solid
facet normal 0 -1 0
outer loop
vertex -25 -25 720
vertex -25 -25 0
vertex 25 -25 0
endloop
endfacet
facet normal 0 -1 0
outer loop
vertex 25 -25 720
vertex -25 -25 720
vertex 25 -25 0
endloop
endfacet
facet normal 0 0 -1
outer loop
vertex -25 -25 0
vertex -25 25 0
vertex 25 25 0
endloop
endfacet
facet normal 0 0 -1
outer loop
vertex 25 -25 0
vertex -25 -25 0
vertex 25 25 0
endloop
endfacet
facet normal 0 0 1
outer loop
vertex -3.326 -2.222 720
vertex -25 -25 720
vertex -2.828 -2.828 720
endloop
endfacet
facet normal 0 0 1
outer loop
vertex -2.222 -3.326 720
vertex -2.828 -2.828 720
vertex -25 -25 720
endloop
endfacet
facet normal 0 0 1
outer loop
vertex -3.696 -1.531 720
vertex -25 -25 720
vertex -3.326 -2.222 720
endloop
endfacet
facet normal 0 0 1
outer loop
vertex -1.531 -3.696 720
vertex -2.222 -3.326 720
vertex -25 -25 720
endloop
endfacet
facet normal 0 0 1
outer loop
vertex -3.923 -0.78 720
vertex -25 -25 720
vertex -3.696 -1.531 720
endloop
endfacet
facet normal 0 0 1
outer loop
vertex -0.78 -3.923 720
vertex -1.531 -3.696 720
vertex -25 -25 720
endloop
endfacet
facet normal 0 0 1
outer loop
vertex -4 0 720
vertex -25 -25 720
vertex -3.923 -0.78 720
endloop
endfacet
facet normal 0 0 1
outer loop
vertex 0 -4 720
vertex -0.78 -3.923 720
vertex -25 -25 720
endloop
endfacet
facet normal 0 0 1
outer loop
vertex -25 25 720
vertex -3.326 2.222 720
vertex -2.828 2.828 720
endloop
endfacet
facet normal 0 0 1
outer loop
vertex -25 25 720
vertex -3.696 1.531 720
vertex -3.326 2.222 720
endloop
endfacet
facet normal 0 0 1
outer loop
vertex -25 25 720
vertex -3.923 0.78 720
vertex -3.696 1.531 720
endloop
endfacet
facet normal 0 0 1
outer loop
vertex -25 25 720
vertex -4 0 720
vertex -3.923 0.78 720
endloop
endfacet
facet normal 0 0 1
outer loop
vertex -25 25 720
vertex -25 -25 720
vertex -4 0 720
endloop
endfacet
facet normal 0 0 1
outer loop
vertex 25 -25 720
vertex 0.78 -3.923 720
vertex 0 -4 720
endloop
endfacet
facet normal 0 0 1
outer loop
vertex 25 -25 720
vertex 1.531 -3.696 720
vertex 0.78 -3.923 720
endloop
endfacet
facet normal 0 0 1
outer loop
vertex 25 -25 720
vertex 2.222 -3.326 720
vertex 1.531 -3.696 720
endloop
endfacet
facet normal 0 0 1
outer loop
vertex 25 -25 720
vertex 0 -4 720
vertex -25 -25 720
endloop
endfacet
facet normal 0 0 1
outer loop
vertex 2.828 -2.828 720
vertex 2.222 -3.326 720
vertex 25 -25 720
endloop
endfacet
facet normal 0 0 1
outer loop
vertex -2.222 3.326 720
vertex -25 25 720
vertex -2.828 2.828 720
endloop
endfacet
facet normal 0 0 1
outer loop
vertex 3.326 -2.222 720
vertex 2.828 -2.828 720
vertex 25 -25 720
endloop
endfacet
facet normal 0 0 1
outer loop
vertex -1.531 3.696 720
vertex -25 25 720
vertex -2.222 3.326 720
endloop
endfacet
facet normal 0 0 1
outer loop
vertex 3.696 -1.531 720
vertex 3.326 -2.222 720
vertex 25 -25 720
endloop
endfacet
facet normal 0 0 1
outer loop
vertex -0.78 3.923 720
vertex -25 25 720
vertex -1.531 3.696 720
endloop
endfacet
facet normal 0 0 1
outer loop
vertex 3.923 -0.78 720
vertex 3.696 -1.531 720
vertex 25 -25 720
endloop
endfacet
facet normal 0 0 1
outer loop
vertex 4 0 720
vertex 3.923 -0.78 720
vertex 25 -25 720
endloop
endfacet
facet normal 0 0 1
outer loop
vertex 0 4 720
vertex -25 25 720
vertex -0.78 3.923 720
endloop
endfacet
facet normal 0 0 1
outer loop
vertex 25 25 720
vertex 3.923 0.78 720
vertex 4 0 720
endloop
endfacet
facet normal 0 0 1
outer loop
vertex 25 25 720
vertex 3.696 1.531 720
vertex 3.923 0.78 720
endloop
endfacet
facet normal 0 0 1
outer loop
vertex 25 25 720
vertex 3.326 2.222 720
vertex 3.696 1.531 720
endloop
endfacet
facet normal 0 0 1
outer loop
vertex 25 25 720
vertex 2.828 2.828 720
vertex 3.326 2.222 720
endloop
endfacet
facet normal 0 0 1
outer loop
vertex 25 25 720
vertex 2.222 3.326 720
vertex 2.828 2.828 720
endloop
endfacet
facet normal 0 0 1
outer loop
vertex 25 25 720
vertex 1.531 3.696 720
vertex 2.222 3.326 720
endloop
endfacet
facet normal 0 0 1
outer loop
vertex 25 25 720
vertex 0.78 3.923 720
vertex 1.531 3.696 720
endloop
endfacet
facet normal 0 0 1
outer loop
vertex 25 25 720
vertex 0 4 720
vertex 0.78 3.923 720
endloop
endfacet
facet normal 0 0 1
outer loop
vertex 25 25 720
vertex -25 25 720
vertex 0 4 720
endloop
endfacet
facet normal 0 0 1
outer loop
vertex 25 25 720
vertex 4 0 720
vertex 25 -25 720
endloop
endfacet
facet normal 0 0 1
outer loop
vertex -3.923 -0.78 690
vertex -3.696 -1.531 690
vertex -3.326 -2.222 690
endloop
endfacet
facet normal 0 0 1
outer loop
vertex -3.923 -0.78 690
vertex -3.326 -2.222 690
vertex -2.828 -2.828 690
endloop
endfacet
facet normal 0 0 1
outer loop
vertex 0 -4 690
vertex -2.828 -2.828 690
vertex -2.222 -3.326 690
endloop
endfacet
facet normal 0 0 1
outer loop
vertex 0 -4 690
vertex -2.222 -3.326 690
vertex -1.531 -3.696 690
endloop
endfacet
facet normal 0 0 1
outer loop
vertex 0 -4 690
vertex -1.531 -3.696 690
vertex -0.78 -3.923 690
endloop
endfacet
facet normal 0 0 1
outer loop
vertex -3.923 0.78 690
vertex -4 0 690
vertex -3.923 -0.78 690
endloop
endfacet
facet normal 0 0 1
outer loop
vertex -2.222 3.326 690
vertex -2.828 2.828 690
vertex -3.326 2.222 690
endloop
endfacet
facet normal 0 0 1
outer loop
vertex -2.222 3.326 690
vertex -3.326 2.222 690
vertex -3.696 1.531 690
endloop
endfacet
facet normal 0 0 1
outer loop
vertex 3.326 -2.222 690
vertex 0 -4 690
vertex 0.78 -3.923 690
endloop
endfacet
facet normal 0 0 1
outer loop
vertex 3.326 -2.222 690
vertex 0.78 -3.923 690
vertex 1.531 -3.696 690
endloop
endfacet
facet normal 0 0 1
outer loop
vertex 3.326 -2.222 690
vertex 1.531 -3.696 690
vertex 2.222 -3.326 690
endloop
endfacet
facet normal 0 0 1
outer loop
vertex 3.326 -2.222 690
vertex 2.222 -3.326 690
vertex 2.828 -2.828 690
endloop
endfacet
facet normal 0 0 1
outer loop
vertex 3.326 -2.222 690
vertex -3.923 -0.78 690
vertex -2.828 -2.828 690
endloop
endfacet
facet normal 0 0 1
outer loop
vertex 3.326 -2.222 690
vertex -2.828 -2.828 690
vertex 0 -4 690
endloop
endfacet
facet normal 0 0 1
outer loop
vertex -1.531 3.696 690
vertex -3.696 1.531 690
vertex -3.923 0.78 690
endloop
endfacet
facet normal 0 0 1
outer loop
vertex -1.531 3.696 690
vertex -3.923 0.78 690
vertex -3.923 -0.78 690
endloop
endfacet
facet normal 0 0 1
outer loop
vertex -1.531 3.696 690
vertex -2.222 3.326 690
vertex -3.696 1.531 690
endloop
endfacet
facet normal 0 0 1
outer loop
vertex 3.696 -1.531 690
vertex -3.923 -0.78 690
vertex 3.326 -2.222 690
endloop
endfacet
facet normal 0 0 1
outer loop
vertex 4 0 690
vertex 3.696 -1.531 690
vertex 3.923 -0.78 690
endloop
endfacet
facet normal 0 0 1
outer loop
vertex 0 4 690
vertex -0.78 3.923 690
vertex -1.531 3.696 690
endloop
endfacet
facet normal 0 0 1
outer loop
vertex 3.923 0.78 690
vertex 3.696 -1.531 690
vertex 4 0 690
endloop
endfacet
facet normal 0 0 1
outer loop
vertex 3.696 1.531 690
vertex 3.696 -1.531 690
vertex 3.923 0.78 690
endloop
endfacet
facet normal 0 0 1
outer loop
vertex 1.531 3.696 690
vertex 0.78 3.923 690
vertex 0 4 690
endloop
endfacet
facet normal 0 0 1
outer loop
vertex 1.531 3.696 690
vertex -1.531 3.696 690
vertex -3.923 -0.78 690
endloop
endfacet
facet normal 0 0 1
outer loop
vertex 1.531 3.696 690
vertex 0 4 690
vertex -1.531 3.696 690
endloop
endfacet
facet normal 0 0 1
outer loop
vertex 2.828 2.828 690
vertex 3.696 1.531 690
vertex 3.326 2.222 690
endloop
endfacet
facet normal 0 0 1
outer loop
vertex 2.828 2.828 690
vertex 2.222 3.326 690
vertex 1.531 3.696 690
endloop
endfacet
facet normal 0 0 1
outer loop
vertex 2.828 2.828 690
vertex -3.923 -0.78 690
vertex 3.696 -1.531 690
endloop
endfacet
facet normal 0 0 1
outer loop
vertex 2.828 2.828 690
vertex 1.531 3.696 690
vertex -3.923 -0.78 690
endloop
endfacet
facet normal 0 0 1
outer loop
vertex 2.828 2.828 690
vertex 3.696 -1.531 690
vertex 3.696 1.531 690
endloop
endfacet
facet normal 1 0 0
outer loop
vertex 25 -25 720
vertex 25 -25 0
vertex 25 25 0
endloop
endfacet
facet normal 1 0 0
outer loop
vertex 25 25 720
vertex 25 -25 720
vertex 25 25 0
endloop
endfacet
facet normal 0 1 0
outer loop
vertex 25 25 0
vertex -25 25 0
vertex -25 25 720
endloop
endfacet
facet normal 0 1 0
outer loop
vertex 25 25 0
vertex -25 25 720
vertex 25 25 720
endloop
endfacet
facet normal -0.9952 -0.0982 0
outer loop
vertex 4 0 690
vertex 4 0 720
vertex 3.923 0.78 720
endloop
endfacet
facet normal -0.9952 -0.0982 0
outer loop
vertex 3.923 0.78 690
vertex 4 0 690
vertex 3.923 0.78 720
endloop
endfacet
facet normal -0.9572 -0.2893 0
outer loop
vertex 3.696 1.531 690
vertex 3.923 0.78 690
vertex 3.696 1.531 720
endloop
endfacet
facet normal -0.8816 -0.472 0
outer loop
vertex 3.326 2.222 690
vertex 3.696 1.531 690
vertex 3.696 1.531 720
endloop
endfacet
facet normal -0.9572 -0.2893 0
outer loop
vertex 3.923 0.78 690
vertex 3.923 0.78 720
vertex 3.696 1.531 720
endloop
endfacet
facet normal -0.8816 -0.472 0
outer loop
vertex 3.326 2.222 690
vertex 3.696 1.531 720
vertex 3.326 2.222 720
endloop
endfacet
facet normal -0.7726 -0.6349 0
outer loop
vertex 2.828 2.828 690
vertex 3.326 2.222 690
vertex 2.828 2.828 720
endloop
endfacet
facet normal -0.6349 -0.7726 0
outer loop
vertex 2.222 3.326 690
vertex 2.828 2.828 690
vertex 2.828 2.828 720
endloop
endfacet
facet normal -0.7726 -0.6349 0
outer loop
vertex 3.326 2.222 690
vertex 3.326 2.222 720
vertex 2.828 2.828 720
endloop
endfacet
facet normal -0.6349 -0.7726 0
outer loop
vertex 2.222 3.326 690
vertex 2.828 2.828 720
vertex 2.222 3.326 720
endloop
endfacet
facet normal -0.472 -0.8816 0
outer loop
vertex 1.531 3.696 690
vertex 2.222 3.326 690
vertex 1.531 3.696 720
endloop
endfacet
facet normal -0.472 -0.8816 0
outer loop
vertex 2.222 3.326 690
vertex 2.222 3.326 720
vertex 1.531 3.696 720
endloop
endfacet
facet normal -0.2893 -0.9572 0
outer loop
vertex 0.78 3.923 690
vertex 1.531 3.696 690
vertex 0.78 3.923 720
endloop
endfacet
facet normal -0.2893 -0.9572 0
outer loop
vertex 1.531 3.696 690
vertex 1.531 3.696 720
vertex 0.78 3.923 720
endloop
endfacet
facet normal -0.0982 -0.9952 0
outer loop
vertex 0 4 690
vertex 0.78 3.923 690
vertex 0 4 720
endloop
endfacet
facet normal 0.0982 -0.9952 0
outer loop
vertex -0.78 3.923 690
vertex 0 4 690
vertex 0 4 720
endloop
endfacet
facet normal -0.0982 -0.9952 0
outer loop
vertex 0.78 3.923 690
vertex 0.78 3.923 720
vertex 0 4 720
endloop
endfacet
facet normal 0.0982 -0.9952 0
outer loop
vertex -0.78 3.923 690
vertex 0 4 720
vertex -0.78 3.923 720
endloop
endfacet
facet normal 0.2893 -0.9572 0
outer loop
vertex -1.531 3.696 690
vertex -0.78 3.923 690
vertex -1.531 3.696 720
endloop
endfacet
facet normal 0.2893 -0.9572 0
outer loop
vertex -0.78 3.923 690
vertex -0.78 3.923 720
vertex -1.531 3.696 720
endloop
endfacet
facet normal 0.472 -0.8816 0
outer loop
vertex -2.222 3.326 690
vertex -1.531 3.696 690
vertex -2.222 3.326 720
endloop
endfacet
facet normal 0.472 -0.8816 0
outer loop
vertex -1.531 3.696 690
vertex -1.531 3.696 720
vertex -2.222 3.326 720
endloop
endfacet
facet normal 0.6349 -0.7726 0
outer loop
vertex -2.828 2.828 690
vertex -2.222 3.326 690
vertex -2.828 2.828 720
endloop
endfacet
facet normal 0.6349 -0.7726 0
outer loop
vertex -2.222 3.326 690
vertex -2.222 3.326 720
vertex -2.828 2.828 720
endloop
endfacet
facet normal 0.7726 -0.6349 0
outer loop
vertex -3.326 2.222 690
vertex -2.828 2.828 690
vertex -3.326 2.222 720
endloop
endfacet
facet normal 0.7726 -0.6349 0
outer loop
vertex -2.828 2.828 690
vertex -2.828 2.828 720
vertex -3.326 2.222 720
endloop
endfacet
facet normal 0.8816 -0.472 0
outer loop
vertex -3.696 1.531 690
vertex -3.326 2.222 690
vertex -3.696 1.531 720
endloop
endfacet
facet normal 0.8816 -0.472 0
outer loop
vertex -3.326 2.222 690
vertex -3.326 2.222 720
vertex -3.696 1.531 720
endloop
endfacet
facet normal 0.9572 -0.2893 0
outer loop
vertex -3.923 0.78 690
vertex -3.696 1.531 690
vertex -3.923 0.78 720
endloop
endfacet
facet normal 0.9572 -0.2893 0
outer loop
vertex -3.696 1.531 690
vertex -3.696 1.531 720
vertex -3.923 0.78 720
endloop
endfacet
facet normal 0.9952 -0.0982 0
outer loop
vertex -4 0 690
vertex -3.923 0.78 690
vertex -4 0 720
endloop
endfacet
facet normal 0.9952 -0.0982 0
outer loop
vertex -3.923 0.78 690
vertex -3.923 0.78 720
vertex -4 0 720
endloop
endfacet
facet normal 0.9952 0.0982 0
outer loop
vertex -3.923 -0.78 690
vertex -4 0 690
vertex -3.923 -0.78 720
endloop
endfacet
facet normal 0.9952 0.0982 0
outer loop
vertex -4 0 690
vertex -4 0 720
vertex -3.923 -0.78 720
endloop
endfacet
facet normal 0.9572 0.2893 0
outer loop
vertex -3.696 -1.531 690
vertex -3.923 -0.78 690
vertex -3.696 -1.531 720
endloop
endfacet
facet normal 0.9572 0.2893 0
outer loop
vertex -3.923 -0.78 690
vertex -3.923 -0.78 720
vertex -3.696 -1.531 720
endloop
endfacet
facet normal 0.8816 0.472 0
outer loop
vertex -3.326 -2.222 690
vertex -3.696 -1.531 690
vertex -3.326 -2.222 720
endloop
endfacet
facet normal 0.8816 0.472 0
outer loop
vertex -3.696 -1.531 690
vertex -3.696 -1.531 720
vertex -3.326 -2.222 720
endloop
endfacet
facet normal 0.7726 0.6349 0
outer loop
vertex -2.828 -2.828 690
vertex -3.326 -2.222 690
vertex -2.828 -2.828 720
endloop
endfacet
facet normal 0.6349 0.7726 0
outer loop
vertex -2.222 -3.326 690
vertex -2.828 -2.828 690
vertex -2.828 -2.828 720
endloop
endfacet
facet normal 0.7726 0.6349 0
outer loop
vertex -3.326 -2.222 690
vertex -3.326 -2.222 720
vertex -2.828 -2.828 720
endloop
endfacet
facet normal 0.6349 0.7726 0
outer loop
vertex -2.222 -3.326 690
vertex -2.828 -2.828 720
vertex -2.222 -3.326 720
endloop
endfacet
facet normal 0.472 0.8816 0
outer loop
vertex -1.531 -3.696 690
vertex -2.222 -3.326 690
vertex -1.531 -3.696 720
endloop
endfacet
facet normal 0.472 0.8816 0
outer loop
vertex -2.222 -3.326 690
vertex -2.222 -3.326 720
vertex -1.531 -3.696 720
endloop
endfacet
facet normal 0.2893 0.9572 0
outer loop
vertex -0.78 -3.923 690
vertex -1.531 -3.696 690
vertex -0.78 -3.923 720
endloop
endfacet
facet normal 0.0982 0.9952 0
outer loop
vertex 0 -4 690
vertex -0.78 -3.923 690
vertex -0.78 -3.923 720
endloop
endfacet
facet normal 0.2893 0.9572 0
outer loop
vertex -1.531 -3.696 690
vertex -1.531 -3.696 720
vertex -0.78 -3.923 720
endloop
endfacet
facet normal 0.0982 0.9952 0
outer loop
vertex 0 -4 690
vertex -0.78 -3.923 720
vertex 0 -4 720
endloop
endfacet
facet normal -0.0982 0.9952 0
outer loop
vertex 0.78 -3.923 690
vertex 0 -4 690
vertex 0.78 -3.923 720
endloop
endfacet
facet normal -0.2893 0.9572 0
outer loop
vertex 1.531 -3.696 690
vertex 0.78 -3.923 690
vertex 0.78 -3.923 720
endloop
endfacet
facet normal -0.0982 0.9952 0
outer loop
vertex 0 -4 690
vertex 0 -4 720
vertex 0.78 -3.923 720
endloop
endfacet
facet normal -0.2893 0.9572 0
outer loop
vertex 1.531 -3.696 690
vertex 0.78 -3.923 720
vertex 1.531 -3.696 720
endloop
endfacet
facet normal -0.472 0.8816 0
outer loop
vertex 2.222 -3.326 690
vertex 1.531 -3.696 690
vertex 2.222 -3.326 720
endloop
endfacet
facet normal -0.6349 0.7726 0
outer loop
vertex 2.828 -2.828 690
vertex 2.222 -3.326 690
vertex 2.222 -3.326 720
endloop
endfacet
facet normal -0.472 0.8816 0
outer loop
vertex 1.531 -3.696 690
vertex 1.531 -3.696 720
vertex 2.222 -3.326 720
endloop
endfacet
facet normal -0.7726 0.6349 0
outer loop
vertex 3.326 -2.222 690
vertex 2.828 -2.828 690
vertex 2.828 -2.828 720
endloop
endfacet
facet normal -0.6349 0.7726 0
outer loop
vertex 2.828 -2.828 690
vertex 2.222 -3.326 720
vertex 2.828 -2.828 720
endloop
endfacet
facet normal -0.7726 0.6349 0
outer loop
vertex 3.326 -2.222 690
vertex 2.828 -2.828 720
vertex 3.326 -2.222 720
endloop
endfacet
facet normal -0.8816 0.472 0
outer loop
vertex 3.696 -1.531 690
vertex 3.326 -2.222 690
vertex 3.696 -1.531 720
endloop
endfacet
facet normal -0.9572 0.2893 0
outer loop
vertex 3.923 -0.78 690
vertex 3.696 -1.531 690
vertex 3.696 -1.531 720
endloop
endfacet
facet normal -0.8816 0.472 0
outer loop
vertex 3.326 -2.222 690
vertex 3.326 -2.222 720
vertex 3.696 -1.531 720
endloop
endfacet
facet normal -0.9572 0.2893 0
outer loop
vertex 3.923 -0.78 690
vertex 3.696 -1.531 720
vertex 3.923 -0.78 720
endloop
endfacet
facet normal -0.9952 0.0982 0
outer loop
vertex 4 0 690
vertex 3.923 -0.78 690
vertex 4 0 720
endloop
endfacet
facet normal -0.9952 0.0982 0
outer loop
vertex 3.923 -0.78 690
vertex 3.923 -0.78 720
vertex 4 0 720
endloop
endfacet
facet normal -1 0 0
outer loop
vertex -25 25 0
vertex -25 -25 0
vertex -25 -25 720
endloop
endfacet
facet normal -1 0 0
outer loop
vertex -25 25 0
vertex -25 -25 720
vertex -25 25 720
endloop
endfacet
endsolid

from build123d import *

# Parameters (mm, degrees)
SKETCH1_W           = 50
SKETCH1_H           = 50
BOSS_EXTRUDE1_DEPTH = 720
SKETCH2_R           = 4
CUT_EXTRUDE1_DEPTH  = 30
SKETCH3_W           = 50
SKETCH3_H           = 50
BOSS_EXTRUDE2_DEPTH = 720
SKETCH4_R           = 4
CUT_EXTRUDE2_DEPTH  = 30


with BuildPart() as part:
    # Sketch1 → Boss-Extrude1 (new body)
    with BuildSketch(Plane.XY):
        Rectangle(SKETCH1_W, SKETCH1_H)
    extrude(amount=BOSS_EXTRUDE1_DEPTH)

    # Sketch2 → Cut-Extrude1 (cut)
    with BuildSketch(Plane.XY.offset(720)):
        Circle(SKETCH2_R)
    extrude(amount=-CUT_EXTRUDE1_DEPTH, mode=Mode.SUBTRACT)

    # Sketch3 → Boss-Extrude2 (add)
    with BuildSketch(Plane.XY):
        Rectangle(SKETCH3_W, SKETCH3_H)
    extrude(amount=BOSS_EXTRUDE2_DEPTH)

    # Sketch4 → Cut-Extrude2 (cut)
    with BuildSketch(Plane.XY.offset(720)):
        Circle(SKETCH4_R)
    extrude(amount=-CUT_EXTRUDE2_DEPTH, mode=Mode.SUBTRACT)


solid = part.part
